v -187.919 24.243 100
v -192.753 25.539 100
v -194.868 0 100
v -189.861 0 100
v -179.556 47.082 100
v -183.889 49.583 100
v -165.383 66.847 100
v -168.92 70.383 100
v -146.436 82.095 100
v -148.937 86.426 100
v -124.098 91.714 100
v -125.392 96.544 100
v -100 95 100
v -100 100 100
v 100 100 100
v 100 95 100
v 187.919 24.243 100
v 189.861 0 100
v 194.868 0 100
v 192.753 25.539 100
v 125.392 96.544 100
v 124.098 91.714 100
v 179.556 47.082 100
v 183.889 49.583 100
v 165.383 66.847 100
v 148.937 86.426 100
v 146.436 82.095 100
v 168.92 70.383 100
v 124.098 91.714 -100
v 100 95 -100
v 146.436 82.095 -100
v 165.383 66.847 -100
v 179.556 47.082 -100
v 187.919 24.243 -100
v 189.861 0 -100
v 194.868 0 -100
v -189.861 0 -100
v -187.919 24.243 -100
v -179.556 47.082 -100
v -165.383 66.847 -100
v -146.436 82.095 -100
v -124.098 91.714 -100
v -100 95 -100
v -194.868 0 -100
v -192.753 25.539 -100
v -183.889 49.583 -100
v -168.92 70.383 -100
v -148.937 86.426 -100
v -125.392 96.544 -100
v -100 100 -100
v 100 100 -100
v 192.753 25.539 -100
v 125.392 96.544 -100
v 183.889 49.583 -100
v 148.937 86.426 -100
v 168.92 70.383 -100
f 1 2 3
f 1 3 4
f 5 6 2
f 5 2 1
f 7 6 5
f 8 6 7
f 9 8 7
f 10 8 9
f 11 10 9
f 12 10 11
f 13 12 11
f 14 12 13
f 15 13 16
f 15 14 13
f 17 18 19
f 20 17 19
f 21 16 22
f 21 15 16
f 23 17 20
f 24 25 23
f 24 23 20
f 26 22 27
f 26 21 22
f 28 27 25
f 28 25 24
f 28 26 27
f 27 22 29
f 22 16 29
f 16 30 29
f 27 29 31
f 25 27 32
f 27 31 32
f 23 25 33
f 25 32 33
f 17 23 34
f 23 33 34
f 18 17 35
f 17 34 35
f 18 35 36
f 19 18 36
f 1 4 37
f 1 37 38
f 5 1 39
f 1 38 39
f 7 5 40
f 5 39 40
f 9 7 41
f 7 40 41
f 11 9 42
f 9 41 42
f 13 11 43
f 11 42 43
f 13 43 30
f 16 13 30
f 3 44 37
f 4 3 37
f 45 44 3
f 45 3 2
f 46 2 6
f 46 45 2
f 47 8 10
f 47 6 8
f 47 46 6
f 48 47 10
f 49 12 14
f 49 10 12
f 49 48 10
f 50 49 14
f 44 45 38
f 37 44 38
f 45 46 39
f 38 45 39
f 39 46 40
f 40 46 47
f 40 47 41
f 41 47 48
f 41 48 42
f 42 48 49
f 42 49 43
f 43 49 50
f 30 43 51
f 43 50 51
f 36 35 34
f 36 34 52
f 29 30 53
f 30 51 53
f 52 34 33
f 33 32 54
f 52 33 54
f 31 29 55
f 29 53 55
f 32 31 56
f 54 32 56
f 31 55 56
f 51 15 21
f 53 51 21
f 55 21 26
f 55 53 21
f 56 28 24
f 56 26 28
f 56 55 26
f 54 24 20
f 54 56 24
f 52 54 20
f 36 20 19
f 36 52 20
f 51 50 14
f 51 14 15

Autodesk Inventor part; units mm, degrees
sketch "Sketch1" plane through (0, 0, 0) normal (0, 0, 1) x (1, 0, 0)
  line L0 (-100, 100) -> (100, 100)
  arc A0 (-100, 100) -> (-194.8683, 0) centre (-100, 5) ccw
  arc A1 (194.8683, 0) -> (100, 100) centre (100, 5) ccw
  arc A2 (-100, 95) -> (-189.861, 0) centre (-100, 5) ccw
  line L1 (-100, 95) -> (100, 95)
  arc A3 (189.861, 0) -> (100, 95) centre (100, 5) ccw
  line L2 (-194.8683, 0) -> (-189.861, 0)
  line L3 (189.861, 0) -> (194.8683, 0)
  point P0 (0, 0)
  point P1 (0, 100)
  dimension "d0" = 200
  dimension "d1" = 100
  dimension "d3" = 5
  dimension "d9" = 90
extrude "Extrusion1" add sketch "Sketch1" along normal mid plane 200
properties part number "Sessao_28_03_003_001" material "Wood (Walnut)"
